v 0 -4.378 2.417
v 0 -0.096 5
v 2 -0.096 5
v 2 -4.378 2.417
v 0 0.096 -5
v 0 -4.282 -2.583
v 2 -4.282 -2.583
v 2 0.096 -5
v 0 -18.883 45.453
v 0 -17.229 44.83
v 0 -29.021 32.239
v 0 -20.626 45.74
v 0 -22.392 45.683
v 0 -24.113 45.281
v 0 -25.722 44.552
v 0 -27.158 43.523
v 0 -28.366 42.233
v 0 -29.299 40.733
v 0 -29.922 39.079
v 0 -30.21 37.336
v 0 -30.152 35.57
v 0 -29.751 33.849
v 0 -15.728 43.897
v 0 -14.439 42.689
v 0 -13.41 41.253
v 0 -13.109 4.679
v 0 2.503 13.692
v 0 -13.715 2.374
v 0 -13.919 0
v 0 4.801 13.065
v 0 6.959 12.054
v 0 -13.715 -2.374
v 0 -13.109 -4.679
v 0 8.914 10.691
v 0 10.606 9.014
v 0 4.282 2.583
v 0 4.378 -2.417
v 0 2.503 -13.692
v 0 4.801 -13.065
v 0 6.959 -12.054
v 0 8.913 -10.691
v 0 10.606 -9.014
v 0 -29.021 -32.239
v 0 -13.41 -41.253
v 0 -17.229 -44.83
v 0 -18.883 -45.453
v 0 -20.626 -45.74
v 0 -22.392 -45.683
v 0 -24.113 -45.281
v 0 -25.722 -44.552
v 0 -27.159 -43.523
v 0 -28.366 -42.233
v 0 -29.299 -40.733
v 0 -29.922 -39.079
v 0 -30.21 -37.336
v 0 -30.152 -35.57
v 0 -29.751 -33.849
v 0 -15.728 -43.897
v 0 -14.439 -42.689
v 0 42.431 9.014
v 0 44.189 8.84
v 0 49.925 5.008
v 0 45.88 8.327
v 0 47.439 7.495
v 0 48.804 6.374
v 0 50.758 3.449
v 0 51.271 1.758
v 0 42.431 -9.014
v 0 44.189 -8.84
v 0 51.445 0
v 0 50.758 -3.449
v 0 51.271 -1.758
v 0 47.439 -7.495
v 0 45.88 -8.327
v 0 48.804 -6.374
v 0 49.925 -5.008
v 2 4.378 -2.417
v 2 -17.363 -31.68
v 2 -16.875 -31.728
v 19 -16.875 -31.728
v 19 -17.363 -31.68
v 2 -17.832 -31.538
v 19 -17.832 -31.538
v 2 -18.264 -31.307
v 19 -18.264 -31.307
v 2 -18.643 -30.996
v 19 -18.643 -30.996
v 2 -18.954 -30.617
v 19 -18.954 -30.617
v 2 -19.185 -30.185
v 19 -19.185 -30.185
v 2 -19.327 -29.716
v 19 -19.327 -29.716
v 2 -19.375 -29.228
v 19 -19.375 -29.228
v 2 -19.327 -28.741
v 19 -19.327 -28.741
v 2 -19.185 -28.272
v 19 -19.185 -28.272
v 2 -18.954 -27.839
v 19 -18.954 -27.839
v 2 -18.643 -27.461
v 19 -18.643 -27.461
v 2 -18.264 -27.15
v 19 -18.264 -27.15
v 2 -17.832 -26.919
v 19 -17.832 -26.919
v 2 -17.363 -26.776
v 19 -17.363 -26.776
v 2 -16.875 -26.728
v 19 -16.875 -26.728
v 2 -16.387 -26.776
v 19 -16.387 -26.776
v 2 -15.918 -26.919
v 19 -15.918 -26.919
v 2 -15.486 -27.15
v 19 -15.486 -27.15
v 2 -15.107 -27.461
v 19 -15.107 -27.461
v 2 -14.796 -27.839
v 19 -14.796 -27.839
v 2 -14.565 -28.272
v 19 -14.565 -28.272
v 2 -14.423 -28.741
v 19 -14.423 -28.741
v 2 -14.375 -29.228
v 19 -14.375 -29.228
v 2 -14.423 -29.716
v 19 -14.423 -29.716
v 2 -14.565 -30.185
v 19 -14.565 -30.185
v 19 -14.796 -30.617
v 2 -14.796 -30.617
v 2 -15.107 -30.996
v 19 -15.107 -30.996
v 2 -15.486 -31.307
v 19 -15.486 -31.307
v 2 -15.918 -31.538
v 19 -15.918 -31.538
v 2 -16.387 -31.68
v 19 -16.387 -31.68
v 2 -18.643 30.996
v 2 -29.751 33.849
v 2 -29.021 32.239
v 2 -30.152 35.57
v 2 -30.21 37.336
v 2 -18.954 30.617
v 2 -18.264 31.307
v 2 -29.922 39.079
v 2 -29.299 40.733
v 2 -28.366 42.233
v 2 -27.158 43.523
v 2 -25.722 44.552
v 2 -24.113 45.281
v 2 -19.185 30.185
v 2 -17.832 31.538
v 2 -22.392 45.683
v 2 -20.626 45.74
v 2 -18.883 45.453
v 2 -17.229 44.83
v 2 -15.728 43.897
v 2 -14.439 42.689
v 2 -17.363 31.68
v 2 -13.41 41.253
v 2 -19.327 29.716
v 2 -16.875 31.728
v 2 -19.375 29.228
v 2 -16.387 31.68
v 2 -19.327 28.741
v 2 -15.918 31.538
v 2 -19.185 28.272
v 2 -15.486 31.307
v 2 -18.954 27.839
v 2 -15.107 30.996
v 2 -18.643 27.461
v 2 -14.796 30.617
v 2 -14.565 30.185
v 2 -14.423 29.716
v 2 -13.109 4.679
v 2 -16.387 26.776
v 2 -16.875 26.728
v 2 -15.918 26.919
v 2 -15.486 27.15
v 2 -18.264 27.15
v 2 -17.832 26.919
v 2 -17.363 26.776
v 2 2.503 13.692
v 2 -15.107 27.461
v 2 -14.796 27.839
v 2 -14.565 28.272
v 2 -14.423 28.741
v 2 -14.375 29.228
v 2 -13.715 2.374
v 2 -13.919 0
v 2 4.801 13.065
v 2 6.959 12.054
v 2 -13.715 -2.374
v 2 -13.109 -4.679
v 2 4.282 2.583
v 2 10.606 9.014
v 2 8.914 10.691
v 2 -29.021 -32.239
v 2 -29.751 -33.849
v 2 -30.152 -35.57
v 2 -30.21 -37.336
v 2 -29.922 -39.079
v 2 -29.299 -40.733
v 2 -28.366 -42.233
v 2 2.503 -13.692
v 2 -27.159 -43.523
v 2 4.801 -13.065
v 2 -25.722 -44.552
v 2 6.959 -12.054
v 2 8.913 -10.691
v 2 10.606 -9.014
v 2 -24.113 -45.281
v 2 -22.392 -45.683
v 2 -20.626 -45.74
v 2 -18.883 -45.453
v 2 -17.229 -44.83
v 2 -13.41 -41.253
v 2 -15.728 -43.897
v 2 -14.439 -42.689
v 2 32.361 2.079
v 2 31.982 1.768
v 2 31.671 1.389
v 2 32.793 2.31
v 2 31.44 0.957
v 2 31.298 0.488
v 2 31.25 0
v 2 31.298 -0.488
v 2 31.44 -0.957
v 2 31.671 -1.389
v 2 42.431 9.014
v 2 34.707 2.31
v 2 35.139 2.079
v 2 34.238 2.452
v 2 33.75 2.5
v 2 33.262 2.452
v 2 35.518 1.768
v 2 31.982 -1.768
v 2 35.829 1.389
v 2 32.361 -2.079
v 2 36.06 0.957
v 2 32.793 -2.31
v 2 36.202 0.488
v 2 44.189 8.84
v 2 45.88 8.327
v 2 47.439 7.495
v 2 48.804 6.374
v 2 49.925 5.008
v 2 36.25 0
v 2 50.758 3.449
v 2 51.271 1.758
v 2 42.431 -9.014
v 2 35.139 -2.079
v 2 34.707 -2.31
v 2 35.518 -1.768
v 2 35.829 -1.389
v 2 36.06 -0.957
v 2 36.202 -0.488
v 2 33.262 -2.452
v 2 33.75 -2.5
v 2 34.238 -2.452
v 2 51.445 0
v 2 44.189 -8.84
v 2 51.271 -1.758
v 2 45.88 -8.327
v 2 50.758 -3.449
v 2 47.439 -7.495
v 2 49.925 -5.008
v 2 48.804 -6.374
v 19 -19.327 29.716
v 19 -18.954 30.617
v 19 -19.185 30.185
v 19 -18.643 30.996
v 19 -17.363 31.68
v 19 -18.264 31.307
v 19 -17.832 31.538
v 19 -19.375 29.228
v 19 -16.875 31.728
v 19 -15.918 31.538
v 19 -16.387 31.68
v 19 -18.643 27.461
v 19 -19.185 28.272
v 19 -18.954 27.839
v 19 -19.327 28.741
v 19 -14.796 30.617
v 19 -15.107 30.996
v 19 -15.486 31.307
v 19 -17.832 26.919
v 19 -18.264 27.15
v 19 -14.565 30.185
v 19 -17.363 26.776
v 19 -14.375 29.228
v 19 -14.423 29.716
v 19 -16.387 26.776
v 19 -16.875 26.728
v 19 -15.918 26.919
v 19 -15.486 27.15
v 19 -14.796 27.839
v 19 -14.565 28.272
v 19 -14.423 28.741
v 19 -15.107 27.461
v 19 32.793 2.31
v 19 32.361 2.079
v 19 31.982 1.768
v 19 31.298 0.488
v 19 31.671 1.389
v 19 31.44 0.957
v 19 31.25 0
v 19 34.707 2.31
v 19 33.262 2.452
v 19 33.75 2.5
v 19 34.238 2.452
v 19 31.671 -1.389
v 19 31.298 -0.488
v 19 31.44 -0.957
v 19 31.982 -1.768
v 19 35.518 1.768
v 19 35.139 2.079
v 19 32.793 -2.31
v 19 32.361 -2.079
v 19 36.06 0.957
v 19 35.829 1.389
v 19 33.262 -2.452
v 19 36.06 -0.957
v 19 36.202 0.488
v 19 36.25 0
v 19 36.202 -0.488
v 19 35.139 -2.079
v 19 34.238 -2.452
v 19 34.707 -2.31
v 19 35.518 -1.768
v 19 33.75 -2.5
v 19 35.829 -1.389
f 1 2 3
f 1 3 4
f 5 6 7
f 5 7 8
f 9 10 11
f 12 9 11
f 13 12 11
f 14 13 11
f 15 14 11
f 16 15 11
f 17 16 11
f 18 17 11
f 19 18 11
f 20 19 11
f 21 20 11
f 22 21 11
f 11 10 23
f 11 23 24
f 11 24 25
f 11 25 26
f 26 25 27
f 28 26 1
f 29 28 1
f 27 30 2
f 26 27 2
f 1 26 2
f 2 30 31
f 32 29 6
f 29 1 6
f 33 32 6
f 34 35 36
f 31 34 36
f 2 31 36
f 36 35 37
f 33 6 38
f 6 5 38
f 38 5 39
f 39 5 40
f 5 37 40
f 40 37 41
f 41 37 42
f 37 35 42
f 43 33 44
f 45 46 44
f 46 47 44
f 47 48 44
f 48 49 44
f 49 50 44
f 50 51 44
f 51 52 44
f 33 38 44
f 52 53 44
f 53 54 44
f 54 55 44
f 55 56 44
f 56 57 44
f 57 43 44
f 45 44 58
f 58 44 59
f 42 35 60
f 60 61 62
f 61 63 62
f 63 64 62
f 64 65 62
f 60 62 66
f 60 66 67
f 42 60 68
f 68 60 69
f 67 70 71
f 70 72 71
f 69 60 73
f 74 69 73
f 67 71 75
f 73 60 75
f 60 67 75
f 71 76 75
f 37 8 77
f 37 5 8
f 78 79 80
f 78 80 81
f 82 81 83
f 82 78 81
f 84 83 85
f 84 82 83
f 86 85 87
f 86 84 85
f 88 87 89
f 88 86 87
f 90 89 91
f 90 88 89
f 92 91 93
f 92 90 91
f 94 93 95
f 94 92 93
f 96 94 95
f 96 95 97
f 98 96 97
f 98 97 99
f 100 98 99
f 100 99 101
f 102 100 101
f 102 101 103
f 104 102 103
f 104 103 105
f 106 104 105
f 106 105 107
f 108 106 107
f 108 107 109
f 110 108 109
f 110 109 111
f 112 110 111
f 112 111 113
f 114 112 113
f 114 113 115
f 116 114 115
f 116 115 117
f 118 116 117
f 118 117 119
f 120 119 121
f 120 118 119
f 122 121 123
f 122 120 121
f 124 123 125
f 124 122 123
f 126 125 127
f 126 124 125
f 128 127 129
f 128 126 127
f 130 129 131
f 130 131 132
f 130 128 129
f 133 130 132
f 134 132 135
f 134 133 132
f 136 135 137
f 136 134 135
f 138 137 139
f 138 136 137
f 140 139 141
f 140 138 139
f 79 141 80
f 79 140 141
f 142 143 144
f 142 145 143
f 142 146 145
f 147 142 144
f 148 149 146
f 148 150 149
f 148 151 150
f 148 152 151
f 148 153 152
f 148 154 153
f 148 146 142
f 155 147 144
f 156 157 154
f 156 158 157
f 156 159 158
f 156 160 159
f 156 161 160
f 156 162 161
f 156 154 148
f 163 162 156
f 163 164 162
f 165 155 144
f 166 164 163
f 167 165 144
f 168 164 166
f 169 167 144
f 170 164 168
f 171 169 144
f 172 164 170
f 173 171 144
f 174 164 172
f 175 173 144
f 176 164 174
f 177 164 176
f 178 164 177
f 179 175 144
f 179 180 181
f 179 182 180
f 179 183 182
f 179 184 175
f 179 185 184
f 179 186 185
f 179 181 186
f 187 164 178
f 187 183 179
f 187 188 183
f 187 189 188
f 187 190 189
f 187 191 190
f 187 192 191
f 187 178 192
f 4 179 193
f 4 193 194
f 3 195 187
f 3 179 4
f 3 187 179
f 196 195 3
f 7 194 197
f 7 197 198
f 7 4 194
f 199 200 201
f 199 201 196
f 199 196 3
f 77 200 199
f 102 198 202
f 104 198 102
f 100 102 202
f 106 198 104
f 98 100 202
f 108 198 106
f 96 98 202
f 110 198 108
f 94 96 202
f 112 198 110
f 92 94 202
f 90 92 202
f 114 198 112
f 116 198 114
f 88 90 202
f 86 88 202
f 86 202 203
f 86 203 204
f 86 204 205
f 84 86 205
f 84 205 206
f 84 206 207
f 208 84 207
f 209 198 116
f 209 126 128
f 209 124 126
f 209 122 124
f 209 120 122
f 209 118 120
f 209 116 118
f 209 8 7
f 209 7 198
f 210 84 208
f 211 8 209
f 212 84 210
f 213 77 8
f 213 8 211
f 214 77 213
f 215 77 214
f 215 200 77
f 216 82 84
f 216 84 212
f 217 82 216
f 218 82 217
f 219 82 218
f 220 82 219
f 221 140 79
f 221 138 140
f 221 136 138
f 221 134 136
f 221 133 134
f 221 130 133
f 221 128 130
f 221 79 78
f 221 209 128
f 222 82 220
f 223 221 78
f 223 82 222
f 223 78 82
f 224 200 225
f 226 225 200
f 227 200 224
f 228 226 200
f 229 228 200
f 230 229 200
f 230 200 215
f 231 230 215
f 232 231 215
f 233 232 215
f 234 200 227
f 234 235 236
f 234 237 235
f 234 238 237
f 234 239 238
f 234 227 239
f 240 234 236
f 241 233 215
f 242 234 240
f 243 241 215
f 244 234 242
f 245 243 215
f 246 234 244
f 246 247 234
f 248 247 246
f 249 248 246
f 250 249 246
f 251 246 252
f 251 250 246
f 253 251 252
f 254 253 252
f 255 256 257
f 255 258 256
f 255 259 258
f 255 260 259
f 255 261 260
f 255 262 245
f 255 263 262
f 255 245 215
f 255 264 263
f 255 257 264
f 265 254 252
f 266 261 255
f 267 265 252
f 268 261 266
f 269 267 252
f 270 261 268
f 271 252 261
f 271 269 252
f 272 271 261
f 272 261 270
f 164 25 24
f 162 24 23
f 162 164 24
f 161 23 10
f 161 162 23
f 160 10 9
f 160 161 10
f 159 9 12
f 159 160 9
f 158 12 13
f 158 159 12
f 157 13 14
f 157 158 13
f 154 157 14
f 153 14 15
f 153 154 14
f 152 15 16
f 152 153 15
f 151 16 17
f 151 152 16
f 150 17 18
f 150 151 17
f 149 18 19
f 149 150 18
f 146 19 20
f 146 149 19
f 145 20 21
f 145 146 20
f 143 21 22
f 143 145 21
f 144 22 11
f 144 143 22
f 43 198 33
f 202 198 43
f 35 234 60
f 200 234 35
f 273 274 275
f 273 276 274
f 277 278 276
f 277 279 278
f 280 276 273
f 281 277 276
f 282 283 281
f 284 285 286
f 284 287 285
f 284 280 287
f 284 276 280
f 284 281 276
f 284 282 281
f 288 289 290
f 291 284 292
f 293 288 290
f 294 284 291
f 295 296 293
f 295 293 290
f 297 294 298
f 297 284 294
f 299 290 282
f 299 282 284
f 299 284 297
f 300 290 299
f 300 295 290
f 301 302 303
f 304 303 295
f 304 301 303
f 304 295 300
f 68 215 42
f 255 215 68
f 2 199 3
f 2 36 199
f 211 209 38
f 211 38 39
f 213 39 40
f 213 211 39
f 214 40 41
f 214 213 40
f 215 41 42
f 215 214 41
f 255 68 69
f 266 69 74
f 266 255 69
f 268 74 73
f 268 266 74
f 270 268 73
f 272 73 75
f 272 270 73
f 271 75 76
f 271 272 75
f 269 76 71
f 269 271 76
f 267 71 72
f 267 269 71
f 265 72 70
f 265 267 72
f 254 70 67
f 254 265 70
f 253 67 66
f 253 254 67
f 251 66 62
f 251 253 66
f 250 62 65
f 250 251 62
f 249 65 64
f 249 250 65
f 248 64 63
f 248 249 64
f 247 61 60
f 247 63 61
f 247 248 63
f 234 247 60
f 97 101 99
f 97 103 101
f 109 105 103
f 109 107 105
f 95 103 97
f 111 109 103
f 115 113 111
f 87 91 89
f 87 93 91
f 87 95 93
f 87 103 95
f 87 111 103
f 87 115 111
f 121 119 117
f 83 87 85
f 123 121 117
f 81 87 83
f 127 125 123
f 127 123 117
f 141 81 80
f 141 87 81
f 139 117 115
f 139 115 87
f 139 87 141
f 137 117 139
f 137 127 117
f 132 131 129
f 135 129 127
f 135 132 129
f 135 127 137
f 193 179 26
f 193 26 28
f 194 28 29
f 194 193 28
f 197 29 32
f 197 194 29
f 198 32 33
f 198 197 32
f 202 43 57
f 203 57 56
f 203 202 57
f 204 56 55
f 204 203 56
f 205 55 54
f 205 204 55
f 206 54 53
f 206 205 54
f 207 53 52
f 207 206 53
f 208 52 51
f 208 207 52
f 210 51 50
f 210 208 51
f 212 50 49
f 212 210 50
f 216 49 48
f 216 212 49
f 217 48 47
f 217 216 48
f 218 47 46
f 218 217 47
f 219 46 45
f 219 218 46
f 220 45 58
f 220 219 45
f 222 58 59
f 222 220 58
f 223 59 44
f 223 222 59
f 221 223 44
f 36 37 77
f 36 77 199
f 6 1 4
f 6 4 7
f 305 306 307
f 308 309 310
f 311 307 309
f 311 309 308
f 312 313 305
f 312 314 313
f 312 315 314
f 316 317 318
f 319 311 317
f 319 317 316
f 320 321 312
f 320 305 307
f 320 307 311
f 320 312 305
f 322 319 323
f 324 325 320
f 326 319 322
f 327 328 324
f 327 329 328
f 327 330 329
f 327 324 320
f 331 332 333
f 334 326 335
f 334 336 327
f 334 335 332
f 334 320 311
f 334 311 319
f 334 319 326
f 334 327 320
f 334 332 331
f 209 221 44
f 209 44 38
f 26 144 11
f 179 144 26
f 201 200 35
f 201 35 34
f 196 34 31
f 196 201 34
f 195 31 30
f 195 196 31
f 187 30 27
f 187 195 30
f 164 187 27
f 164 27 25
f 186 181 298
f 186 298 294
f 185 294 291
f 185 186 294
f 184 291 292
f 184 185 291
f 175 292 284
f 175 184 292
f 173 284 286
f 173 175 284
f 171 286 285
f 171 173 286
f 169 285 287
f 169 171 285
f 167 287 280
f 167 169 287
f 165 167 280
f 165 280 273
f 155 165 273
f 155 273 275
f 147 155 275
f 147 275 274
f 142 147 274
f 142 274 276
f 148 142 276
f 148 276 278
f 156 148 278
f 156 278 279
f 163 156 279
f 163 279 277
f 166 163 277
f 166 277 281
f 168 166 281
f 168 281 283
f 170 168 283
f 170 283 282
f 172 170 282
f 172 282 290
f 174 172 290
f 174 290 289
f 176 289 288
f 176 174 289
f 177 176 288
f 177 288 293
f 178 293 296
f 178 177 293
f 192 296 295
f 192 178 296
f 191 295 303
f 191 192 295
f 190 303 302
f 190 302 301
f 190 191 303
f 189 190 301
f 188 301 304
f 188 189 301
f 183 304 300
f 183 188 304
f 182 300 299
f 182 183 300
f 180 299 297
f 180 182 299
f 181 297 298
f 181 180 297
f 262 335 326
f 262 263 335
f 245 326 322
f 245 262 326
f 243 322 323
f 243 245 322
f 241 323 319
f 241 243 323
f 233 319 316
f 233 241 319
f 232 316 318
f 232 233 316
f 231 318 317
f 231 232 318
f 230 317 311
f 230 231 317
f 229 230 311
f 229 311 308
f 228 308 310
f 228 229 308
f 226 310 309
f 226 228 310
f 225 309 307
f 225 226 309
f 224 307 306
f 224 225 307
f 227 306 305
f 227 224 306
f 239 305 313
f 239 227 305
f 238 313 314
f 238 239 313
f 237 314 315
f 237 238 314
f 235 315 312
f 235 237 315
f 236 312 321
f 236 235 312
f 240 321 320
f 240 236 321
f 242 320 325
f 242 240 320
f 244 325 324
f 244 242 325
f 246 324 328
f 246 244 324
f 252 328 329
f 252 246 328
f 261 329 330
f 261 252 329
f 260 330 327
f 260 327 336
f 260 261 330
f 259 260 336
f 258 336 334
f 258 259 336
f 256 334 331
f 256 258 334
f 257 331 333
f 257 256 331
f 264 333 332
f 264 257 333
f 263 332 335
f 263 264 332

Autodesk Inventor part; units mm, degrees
ref_plane "YZ Plane" through (0, 0, 0) normal (1, 0, 0) x (0, 1, 0)
ref_plane "XZ Plane" through (0, 0, 0) normal (0, 1, 0) x (-1, 0, 0)
ref_plane "XY Plane" through (0, 0, 0) normal (0, 0, 1) x (1, 0, 0)
sketch "Esboço1" plane through (0, 0, 0) normal (1, 0, 0) x (0, 1, 0)
  circle A0 centre (0, 0) radius 51.5625
  dimension "d0" = 103.125
extrude "Extrusão1" add sketch "Esboço1" along normal blind 2
sketch "Esboço2" plane through (2, 0, 0) normal (1, 0, 0) x (0, 0, -1)
  point P0 (0, 0)
sketch "Esboço3" plane through (2, 0, 0) normal (1, 0, 0) x (0, 0, -1)
  line L0 (-44.5522, -25.7222) -> (-12.0542, -6.9595)
  line L1 (12.0542, -6.9595) -> (44.5522, -25.7222)
  line L2 (0, 13.919) -> (0, 51.4445)
  circle A0 centre (0, 0) radius 51.4445
  circle A1 centre (0, 0) radius 33.75
  circle A2 centre (0, 0) radius 51.5625 projected
  line L3 (-44.5522, -25.7222) -> (0, 0) construction
  line L4 (-32.2394, -29.0214) -> (-4.6786, -13.1092)
  line L5 (-13.6921, 2.5028) -> (-41.253, -13.4095)
  arc A3 (-41.253, -13.4095) -> (-32.2394, -29.0214) centre (-36.7462, -21.2154) ccw
  line L6 (0, 13.919) -> (0, 51.4445)
  line L7 (0, 0) -> (0, 51.4445) construction
  line L8 (9.0136, 10.6063) -> (9.0136, 42.4309)
  line L9 (-9.0136, 42.4309) -> (-9.0136, 10.6063)
  arc A4 (9.0136, 42.4309) -> (-9.0136, 42.4309) centre (0, 42.4309) ccw
  line L10 (12.0542, -6.9595) -> (44.5522, -25.7222)
  line L11 (0, 0) -> (44.5522, -25.7222) construction
  line L12 (4.6786, -13.1092) -> (32.2394, -29.0214)
  line L13 (41.253, -13.4095) -> (13.6921, 2.5028)
  arc A5 (32.2394, -29.0214) -> (41.253, -13.4095) centre (36.7462, -21.2154) ccw
  arc A6 (-9.0136, 10.6063) -> (-13.6921, 2.5028) centre (0, 0) ccw
  arc A7 (-4.6786, -13.1092) -> (4.6786, -13.1092) centre (0, 0) ccw
  arc A8 (13.6921, 2.5028) -> (9.0136, 10.6063) centre (0, 0) ccw
  circle A9 centre (0, 33.75) radius 2.5
  circle A10 centre (29.2284, -16.875) radius 2.5
  circle A11 centre (-29.2284, -16.875) radius 2.5
  point P0 (-22.2761, -12.8611)
  point P1 (0, 51.4445)
  point P2 (0, 25.7222)
  point P3 (44.5522, -25.7222)
  point P4 (22.2761, -12.8611)
  dimension "d5" = 5
  dimension "d6" = 5
  dimension "d7" = 5
  dimension "d8" = 103.125
  dimension "d9" = 67.5
extrude "Extrusão2" cut sketch "Esboço3" against normal blind 2 contours A3 L5 A1 A11 L0 | L0 A11 A1 L4 A3 | A11 A1 L0 | L0 A1 A11 | A4 L8 A1 A9 L2 | L2 A9 A1 L9 A4 | A5 L12 A1 A10 L1 | L1 A10 A1 L13 A5 | A1 A11 L0 | L0 A11 A1 | A1 L5 A6 L9 A9 L8 A8 L13 A10 L12 A7 L4 A11 | A9 A1 L2 | L2 A1 A9 | A10 A1 L1 | L1 A1 A10 | A1 A9 L2 | L2 A9 A1 | A1 A10 L1 | L1 A10 A1 keep common part
sketch "Esboço4" plane through (2, 0, 0) normal (1, 0, 0) x (0, 0, -1)
  circle A0 centre (0, 0) radius 33.75
  circle A1 centre (0, 33.75) radius 2.5
  circle A2 centre (-29.2284, -16.875) radius 2.5
  circle A3 centre (29.2284, -16.875) radius 2.5
  dimension "d10" = 67.5
  dimension "d11" = 5
  dimension "d14" = 360
extrude "Extrusão3" add sketch "Esboço4" along normal blind 17 contours A1 A0 | A0 A1 | A3 A0 | A0 A3 | A2 A0 | A0 A2
sketch "Esboço5" plane through (0, 0, 0) normal (-1, 0, 0) x (0, 0, 1)
  line L0 (5, -0.0957) -> (2.4171, -4.378)
  line L1 (2.4171, -4.378) -> (-2.5829, -4.2823)
  line L2 (-2.5829, -4.2823) -> (-5, 0.0957)
  line L3 (-5, 0.0957) -> (-2.4171, 4.378)
  line L4 (-2.4171, 4.378) -> (2.5829, 4.2823)
  line L5 (2.5829, 4.2823) -> (5, -0.0957)
  point P0 (0, 0)
  dimension "d18" = 10
extrude "Extrusão4" cut sketch "Esboço5" against normal blind 17
equation "\"d5\" = D_Furo_Planeta"
equation "\"d6\" = D_Furo_Planeta"
equation "\"d7\" = D_Furo_Planeta"
equation "\"d11\" = D_Furo_Planeta"
equation "\"modulo\" = 1.5"
equation "\"delta\" = 0.3"
equation "\"D_Furo_Sol\" = 8"
equation "\"D_Furo_Planeta\" = 5"
equation "\"Rendimento_eta\" = 0.85"
equation "\"Teste_Montagem\" = 0"
properties part number "Porta_Satelite"
